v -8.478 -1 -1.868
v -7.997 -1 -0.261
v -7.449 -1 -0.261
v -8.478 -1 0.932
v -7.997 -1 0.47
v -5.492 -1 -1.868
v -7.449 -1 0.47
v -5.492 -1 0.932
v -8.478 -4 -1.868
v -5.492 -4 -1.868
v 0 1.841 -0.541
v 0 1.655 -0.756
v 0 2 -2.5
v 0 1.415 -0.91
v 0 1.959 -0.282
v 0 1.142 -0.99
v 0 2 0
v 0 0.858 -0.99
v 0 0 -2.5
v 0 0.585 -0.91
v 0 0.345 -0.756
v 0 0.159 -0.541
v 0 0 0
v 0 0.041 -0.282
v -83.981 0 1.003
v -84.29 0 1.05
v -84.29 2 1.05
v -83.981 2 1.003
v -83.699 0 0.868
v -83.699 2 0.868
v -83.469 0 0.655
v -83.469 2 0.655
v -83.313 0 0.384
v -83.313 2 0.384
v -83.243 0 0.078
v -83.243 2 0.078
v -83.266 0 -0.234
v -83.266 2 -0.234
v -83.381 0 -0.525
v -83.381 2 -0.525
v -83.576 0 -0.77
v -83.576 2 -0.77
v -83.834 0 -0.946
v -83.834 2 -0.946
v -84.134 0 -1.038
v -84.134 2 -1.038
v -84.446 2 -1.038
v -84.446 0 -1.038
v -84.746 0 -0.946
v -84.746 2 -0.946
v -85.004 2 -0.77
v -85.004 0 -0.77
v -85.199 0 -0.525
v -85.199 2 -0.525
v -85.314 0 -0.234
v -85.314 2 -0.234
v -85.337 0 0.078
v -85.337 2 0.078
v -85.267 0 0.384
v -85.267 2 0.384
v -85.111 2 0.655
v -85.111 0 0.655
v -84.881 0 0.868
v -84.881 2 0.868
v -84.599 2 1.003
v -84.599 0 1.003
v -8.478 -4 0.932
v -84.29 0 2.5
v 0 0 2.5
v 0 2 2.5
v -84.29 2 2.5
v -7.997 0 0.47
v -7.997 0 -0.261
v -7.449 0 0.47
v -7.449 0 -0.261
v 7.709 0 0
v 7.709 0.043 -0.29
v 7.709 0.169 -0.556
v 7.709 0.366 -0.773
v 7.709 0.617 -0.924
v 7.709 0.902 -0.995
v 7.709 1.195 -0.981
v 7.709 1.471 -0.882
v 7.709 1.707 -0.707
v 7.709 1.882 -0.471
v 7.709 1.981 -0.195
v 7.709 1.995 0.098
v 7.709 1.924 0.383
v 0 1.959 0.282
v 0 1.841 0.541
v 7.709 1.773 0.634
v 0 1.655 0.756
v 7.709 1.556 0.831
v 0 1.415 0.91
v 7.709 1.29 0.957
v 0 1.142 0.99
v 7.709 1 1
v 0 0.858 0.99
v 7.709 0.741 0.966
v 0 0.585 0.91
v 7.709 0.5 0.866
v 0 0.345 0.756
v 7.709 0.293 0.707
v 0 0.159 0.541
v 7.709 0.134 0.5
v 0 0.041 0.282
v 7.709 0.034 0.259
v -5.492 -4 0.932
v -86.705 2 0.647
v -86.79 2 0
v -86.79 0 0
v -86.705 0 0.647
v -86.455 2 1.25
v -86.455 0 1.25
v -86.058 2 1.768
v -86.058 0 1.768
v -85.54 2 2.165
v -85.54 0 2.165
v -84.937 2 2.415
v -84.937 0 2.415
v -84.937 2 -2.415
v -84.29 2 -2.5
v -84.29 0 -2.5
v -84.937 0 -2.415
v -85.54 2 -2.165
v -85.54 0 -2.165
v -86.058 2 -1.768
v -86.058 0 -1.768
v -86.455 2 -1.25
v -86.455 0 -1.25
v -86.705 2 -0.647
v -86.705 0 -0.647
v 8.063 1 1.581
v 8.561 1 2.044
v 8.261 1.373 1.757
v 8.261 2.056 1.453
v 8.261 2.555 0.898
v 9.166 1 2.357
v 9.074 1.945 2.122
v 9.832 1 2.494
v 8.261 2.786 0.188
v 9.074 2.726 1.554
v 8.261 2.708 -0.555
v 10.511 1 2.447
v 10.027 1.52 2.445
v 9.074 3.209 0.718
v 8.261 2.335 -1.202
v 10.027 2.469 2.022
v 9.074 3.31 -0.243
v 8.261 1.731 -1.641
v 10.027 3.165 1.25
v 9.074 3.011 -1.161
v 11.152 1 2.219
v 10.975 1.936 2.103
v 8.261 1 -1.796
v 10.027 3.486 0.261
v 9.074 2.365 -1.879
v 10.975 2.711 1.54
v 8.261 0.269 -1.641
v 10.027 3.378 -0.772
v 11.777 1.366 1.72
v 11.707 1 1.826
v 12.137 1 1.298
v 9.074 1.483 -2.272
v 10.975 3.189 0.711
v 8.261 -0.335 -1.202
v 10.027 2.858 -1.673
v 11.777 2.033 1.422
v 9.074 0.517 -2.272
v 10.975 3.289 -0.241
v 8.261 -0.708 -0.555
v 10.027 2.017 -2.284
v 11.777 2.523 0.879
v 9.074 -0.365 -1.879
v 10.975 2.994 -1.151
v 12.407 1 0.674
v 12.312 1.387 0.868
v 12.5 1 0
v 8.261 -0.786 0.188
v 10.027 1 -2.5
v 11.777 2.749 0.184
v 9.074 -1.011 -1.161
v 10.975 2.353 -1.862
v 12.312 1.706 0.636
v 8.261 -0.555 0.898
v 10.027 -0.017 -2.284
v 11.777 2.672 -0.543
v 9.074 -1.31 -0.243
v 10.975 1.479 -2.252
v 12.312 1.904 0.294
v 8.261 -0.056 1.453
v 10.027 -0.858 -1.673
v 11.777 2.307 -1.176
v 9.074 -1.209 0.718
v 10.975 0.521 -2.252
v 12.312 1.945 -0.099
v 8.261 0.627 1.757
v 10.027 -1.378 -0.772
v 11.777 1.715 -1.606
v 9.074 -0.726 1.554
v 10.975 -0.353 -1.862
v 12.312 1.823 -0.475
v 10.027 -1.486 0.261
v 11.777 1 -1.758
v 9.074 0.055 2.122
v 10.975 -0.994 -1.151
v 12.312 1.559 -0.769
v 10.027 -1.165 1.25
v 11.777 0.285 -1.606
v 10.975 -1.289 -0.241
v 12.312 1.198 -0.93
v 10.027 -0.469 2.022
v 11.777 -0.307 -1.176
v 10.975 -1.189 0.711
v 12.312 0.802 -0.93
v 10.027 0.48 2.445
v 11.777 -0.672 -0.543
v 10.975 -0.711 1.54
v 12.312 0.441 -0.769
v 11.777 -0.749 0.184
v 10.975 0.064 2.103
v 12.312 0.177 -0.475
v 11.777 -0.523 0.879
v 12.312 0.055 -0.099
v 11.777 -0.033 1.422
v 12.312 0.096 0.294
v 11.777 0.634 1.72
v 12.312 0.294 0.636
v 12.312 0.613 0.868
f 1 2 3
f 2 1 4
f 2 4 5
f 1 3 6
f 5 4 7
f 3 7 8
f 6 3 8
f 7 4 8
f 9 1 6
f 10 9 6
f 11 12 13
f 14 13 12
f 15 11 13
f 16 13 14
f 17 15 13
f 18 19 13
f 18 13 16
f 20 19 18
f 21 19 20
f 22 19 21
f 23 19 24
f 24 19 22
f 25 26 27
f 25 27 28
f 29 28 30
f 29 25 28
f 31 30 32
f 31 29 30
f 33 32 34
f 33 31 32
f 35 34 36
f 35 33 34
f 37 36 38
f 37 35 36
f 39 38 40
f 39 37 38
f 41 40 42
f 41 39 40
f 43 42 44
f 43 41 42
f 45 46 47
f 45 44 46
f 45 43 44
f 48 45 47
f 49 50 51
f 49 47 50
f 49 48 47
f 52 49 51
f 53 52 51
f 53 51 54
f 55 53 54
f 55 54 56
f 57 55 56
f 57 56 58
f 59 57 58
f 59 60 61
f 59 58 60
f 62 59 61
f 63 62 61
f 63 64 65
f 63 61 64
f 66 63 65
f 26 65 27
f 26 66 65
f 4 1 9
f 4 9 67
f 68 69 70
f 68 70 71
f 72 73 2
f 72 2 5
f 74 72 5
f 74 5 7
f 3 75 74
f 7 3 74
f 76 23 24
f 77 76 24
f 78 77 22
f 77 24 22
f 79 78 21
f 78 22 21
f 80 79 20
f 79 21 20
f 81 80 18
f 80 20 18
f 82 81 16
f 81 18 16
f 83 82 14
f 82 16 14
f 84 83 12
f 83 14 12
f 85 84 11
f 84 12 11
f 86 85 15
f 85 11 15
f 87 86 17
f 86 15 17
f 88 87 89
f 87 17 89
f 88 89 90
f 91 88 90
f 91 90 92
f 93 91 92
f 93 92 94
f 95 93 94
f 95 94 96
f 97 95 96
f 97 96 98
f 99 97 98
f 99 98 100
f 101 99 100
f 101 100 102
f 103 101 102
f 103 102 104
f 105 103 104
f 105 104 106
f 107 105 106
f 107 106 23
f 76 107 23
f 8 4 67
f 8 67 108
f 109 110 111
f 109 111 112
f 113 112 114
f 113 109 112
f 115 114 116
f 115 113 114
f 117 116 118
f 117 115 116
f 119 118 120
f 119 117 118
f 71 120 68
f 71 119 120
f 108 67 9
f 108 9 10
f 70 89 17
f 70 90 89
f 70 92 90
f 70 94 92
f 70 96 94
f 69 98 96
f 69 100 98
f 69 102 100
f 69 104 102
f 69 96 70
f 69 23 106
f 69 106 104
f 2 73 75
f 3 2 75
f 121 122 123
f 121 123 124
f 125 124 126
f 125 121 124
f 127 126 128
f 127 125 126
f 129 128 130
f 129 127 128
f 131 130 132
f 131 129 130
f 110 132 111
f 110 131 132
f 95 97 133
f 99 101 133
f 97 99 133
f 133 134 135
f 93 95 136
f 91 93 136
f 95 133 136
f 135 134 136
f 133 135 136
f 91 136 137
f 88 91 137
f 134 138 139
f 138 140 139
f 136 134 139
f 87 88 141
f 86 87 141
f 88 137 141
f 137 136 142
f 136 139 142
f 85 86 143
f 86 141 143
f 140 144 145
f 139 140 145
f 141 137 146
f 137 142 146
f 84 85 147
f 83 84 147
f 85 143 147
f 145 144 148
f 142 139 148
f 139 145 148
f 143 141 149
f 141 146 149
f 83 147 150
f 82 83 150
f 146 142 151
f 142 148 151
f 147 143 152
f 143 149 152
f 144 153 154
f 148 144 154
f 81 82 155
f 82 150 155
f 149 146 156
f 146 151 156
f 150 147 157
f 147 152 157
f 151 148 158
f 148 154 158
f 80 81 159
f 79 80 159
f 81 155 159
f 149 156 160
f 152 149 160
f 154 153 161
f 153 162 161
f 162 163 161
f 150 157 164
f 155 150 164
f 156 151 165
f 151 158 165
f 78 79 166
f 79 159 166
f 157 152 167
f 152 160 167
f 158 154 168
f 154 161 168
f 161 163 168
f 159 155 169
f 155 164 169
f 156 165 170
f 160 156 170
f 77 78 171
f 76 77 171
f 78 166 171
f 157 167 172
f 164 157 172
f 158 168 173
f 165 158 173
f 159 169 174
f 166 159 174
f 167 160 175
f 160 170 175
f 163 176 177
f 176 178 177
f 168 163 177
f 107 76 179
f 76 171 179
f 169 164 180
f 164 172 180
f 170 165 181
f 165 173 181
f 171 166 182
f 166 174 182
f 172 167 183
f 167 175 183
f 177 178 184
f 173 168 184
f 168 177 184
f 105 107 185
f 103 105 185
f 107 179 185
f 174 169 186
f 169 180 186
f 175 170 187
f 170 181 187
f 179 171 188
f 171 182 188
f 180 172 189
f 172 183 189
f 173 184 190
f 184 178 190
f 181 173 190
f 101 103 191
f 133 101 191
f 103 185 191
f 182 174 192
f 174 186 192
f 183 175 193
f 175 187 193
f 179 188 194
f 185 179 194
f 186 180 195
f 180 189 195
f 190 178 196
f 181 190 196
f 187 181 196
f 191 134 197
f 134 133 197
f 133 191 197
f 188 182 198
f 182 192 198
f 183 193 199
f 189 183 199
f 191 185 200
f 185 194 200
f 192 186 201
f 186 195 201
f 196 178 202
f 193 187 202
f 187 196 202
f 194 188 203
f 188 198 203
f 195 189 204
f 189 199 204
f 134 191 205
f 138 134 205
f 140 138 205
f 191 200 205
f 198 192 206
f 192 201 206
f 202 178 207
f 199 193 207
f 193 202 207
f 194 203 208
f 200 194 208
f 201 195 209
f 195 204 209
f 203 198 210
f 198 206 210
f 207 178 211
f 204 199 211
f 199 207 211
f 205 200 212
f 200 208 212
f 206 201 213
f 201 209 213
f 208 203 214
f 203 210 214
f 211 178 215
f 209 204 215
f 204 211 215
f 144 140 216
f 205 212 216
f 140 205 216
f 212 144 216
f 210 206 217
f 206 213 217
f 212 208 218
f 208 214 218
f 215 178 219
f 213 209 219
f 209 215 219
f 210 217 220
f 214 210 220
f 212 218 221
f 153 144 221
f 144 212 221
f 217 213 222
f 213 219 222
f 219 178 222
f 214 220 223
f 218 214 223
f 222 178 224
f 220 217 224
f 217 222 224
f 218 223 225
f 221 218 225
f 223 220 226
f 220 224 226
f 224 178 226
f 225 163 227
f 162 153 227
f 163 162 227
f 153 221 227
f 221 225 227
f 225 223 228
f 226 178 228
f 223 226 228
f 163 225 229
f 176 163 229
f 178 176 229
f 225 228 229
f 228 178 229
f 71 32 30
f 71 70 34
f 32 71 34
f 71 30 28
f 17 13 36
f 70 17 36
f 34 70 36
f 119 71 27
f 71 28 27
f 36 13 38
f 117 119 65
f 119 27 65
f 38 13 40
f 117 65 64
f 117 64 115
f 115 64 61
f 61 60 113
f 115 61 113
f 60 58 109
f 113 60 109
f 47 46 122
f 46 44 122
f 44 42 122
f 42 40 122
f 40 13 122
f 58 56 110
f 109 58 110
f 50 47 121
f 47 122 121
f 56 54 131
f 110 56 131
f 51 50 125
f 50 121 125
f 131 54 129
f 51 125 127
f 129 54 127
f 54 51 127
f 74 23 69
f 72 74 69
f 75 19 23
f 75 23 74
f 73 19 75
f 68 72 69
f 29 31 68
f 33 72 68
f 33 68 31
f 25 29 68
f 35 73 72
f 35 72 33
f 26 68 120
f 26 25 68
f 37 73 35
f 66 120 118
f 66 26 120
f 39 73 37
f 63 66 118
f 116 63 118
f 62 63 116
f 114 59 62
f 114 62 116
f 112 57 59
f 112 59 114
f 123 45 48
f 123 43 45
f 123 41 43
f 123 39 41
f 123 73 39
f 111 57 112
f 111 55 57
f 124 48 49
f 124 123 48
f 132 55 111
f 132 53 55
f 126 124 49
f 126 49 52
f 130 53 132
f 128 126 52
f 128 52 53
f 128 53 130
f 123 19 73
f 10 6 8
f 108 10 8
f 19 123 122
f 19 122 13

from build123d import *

# Parameters (mm, degrees)
SKETCH1_R               = 1
BOSS_EXTRUDE1_DEPTH     = 2
SKETCH4_R               = 1
BOSS_EXTRUDE2_DEPTH     = 11
SKETCH11_W              = 0.548452347
SKETCH11_H              = 0.731269796
BOSS_EXTRUDE3_DEPTH     = 1
SKETCH12_W              = 2.985960681
SKETCH12_H              = 2.799338139
BOSS_EXTRUDE4_DEPTH     = 3
SKETCH15_W              = 5
SKETCH15_H              = 2
BOSS_EXTRUDE5_DEPTH     = 86.79
CUT_EXTRUDE4_DEPTH      = 87.918088451
CUT_EXTRUDE4_DEPTH_BACK = 87.918088451
CUT_EXTRUDE5_DEPTH      = 88.033063258
CUT_EXTRUDE5_DEPTH_BACK = 88.033063258
SKETCH19_R              = 1.05
CUT_EXTRUDE7_DEPTH      = 87.918088451
CUT_EXTRUDE7_DEPTH_BACK = 87.918088451


with BuildPart() as part:
    # Sketch1 → Boss-Extrude1 (new body)
    with BuildSketch(Plane(origin=(0, 0, 0), x_dir=(1, 0, 0), z_dir=(0, 1, 0))):
        with BuildLine():
            Line((-10, 2.5), (0, 2.5))
            Line((0, 2.5), (0, -2.5))
            Line((0, -2.5), (-10, -2.5))
            ThreePointArc((-10, -2.5), (-12.5, 0), (-10, 2.5))
        make_face()
        with Locations((-10, 0)):
            Circle(SKETCH1_R, mode=Mode.SUBTRACT)
    extrude(amount=BOSS_EXTRUDE1_DEPTH)

    # Sketch4 → Boss-Extrude2 (add)
    with BuildSketch(Plane(origin=(0, 0, 0), x_dir=(0, 0, -1), z_dir=(1, 0, 0))):
        with Locations((0, 1)):
            Circle(SKETCH4_R)
    extrude(amount=BOSS_EXTRUDE2_DEPTH)

    # Sketch11 → Boss-Extrude3 (add)
    with BuildSketch(Plane.XZ):
        with Locations((-7.723091918, 0.104467114)):
            Rectangle(SKETCH11_W, SKETCH11_H)
    extrude(amount=BOSS_EXTRUDE3_DEPTH)

    # Sketch12 → Boss-Extrude4 (add)
    with BuildSketch(Plane.XZ.offset(1)):
        with Locations((-6.985405351, -0.467965971)):
            Rectangle(SKETCH12_W, SKETCH12_H)
    extrude(amount=BOSS_EXTRUDE4_DEPTH)

    # Sketch15 → Boss-Extrude5 (add)
    with BuildSketch(Plane(origin=(0, 0, 0), x_dir=(0, 0, -1), z_dir=(1, 0, 0))):
        with Locations((0, 1)):
            Rectangle(SKETCH15_W, SKETCH15_H)
    extrude(amount=-BOSS_EXTRUDE5_DEPTH)

    # Sketch16 → Cut-Extrude4 (cut, two sides: drawn at the far end of the back side and taken through both)
    with BuildSketch(Plane.XZ.offset(-CUT_EXTRUDE4_DEPTH_BACK)):
        with BuildLine():
            ThreePointArc((-84.29, -2.5), (-86.057766953, -1.767766953), (-86.79, 0))
            Line((-86.79, 0), (-86.79, -2.5))
            Line((-86.79, -2.5), (-84.29, -2.5))
        make_face()
    extrude(amount=CUT_EXTRUDE4_DEPTH + CUT_EXTRUDE4_DEPTH_BACK, mode=Mode.SUBTRACT)

    # Sketch19 → Cut-Extrude5 (cut, two sides: drawn at the far end of the back side and taken through both)
    with BuildSketch(Plane(origin=(0, 2, 0), x_dir=(1, 0, 0), z_dir=(0, 1, 0)).offset(-CUT_EXTRUDE5_DEPTH_BACK)):
        with Locations((-84.29, 0)):
            Circle(SKETCH19_R)
    extrude(amount=CUT_EXTRUDE5_DEPTH + CUT_EXTRUDE5_DEPTH_BACK, mode=Mode.SUBTRACT)

    # Sketch16<4> → Cut-Extrude7 (cut, two sides: drawn at the far end of the back side and taken through both)
    with BuildSketch(Plane.XZ.offset(-CUT_EXTRUDE7_DEPTH_BACK)):
        with BuildLine():
            Line((-86.79, 2.5), (-86.79, 0))
            ThreePointArc((-86.79, 0), (-86.057766953, 1.767766953), (-84.29, 2.5))
            Line((-84.29, 2.5), (-86.79, 2.5))
        make_face()
    extrude(amount=CUT_EXTRUDE7_DEPTH + CUT_EXTRUDE7_DEPTH_BACK, mode=Mode.SUBTRACT)

    # Sketch22 → Revolve2 (revolve)
    with BuildSketch(Plane(origin=(0, 1, 0), x_dir=(-1, 0, 0), z_dir=(0, -1, 0))):
        with BuildLine():
            Line((-7.5, 0), (-12.5, 0))
            ThreePointArc((-12.5, 0), (-10, -2.5), (-7.5, 0))
        make_face()
    revolve(axis=Axis((12.5, 1, 0), (-1, 0, 0)))


solid = part.part
